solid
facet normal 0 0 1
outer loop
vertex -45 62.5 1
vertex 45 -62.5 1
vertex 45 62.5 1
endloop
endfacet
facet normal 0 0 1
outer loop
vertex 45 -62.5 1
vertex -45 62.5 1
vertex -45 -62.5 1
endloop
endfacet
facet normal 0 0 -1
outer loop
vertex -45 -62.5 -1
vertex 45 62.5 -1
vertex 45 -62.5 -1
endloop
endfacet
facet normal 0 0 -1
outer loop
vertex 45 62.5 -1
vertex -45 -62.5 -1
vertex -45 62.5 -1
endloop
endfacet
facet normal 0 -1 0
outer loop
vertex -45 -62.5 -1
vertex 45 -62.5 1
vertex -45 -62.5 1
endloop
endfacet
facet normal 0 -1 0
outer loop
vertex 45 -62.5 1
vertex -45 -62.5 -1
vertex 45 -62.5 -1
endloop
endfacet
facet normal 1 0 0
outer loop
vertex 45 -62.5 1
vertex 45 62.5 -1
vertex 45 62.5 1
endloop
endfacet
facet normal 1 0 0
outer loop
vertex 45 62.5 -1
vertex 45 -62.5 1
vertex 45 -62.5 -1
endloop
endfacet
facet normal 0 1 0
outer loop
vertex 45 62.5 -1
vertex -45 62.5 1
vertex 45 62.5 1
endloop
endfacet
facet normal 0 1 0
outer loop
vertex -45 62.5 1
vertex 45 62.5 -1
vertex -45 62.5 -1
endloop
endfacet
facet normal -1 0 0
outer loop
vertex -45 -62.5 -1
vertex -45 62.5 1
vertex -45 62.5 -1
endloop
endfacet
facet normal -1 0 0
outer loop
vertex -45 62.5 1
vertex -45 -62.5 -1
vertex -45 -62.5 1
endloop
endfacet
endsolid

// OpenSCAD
// ========================================
// a 90 x 125 x 2 mm plate
// NeuroCAD canonical IR; dimensions are millimetres
// ========================================
$fn = 48;

cube(size=[90, 125, 2], center=true);
